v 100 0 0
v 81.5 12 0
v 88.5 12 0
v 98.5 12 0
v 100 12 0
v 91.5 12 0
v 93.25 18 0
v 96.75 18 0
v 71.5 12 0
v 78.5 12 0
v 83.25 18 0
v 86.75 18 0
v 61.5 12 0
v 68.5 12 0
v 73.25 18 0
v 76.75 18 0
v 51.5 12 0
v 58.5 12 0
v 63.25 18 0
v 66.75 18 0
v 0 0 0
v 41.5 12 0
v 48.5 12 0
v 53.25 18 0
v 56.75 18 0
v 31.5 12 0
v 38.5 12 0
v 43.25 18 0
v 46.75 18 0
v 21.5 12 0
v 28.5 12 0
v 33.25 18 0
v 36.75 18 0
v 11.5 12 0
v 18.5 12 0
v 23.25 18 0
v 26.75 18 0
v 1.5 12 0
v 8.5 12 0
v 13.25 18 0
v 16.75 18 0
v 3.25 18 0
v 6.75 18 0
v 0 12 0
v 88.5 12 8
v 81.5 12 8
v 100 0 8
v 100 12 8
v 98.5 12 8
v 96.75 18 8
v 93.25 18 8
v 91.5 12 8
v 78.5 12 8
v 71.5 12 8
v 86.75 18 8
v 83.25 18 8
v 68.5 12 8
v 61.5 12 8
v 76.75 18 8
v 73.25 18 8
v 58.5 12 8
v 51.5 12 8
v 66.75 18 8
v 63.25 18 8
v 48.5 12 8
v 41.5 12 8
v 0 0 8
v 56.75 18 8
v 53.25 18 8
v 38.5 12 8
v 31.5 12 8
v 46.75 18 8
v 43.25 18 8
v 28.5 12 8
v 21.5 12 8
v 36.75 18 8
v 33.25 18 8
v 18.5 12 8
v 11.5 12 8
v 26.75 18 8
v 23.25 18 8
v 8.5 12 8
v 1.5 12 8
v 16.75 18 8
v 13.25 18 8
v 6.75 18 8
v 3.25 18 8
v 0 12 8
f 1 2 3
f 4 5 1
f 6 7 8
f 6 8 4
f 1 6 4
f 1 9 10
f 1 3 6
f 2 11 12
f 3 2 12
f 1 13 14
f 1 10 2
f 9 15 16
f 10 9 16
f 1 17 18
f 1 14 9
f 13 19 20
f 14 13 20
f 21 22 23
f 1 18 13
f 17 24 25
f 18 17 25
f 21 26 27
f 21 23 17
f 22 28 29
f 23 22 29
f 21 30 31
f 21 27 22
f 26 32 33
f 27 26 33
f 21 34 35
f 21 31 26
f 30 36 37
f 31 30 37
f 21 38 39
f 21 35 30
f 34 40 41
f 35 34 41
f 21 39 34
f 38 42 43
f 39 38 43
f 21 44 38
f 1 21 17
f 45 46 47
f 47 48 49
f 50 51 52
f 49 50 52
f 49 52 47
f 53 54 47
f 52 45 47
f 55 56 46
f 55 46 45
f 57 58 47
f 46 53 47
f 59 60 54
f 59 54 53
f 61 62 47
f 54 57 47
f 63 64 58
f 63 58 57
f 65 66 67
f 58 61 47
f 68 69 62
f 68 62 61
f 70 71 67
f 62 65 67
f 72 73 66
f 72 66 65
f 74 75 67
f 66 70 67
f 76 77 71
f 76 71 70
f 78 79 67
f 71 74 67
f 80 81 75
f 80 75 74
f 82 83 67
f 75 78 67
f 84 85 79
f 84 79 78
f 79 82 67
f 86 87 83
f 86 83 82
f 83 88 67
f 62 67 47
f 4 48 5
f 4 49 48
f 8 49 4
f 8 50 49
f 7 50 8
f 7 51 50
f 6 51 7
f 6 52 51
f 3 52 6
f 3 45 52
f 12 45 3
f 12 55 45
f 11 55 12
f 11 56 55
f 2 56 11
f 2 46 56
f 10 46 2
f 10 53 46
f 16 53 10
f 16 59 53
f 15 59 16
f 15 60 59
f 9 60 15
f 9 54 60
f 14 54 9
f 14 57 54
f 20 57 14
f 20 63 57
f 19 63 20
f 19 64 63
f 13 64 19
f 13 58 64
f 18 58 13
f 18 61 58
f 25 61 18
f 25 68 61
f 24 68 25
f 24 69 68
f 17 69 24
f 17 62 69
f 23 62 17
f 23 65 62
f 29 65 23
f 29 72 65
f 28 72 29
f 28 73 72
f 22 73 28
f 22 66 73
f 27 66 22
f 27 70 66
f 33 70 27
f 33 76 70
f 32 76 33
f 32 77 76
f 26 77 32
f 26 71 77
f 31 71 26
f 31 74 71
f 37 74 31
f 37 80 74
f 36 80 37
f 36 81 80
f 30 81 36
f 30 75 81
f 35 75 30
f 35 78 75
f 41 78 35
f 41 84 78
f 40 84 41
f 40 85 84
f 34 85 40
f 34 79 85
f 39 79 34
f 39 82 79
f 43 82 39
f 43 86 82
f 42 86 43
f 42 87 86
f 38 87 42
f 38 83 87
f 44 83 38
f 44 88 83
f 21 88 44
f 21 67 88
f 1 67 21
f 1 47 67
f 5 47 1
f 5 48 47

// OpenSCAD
$fn = 32;

// ----------------------------------------------------------------------
// Gear rack: 10 teeth, pitch 10 mm
// ----------------------------------------------------------------------

// --- parameters (mm) ---
teeth = 10;               // number of teeth
pitch = 10;               // tooth pitch, X
root_w = 7;               // tooth width at the root
tip_w = 3.5;              // tooth width at the tip
base_h = 12;              // rack body height, Y
tooth_h = 6;              // tooth height above the body
plate_t = 8;              // rack width, Z (extrusion height)

rack_l = teeth * pitch;  // overall length
total_h = base_h + tooth_h;  // overall height

profile = [[0, 0], [100, 0], [100, 12], [98.5, 12], [96.75, 18], [93.25, 18], [91.5, 12], [88.5, 12], [86.75, 18], [83.25, 18], [81.5, 12], [78.5, 12], [76.75, 18], [73.25, 18], [71.5, 12], [68.5, 12], [66.75, 18], [63.25, 18], [61.5, 12], [58.5, 12], [56.75, 18], [53.25, 18], [51.5, 12], [48.5, 12], [46.75, 18], [43.25, 18], [41.5, 12], [38.5, 12], [36.75, 18], [33.25, 18], [31.5, 12], [28.5, 12], [26.75, 18], [23.25, 18], [21.5, 12], [18.5, 12], [16.75, 18], [13.25, 18], [11.5, 12], [8.5, 12], [6.75, 18], [3.25, 18], [1.5, 12], [0, 12]];  // primary outline, 44 points, counter clockwise

// --- the one profile operation ---
linear_extrude(height = plate_t) polygon(points = profile);
